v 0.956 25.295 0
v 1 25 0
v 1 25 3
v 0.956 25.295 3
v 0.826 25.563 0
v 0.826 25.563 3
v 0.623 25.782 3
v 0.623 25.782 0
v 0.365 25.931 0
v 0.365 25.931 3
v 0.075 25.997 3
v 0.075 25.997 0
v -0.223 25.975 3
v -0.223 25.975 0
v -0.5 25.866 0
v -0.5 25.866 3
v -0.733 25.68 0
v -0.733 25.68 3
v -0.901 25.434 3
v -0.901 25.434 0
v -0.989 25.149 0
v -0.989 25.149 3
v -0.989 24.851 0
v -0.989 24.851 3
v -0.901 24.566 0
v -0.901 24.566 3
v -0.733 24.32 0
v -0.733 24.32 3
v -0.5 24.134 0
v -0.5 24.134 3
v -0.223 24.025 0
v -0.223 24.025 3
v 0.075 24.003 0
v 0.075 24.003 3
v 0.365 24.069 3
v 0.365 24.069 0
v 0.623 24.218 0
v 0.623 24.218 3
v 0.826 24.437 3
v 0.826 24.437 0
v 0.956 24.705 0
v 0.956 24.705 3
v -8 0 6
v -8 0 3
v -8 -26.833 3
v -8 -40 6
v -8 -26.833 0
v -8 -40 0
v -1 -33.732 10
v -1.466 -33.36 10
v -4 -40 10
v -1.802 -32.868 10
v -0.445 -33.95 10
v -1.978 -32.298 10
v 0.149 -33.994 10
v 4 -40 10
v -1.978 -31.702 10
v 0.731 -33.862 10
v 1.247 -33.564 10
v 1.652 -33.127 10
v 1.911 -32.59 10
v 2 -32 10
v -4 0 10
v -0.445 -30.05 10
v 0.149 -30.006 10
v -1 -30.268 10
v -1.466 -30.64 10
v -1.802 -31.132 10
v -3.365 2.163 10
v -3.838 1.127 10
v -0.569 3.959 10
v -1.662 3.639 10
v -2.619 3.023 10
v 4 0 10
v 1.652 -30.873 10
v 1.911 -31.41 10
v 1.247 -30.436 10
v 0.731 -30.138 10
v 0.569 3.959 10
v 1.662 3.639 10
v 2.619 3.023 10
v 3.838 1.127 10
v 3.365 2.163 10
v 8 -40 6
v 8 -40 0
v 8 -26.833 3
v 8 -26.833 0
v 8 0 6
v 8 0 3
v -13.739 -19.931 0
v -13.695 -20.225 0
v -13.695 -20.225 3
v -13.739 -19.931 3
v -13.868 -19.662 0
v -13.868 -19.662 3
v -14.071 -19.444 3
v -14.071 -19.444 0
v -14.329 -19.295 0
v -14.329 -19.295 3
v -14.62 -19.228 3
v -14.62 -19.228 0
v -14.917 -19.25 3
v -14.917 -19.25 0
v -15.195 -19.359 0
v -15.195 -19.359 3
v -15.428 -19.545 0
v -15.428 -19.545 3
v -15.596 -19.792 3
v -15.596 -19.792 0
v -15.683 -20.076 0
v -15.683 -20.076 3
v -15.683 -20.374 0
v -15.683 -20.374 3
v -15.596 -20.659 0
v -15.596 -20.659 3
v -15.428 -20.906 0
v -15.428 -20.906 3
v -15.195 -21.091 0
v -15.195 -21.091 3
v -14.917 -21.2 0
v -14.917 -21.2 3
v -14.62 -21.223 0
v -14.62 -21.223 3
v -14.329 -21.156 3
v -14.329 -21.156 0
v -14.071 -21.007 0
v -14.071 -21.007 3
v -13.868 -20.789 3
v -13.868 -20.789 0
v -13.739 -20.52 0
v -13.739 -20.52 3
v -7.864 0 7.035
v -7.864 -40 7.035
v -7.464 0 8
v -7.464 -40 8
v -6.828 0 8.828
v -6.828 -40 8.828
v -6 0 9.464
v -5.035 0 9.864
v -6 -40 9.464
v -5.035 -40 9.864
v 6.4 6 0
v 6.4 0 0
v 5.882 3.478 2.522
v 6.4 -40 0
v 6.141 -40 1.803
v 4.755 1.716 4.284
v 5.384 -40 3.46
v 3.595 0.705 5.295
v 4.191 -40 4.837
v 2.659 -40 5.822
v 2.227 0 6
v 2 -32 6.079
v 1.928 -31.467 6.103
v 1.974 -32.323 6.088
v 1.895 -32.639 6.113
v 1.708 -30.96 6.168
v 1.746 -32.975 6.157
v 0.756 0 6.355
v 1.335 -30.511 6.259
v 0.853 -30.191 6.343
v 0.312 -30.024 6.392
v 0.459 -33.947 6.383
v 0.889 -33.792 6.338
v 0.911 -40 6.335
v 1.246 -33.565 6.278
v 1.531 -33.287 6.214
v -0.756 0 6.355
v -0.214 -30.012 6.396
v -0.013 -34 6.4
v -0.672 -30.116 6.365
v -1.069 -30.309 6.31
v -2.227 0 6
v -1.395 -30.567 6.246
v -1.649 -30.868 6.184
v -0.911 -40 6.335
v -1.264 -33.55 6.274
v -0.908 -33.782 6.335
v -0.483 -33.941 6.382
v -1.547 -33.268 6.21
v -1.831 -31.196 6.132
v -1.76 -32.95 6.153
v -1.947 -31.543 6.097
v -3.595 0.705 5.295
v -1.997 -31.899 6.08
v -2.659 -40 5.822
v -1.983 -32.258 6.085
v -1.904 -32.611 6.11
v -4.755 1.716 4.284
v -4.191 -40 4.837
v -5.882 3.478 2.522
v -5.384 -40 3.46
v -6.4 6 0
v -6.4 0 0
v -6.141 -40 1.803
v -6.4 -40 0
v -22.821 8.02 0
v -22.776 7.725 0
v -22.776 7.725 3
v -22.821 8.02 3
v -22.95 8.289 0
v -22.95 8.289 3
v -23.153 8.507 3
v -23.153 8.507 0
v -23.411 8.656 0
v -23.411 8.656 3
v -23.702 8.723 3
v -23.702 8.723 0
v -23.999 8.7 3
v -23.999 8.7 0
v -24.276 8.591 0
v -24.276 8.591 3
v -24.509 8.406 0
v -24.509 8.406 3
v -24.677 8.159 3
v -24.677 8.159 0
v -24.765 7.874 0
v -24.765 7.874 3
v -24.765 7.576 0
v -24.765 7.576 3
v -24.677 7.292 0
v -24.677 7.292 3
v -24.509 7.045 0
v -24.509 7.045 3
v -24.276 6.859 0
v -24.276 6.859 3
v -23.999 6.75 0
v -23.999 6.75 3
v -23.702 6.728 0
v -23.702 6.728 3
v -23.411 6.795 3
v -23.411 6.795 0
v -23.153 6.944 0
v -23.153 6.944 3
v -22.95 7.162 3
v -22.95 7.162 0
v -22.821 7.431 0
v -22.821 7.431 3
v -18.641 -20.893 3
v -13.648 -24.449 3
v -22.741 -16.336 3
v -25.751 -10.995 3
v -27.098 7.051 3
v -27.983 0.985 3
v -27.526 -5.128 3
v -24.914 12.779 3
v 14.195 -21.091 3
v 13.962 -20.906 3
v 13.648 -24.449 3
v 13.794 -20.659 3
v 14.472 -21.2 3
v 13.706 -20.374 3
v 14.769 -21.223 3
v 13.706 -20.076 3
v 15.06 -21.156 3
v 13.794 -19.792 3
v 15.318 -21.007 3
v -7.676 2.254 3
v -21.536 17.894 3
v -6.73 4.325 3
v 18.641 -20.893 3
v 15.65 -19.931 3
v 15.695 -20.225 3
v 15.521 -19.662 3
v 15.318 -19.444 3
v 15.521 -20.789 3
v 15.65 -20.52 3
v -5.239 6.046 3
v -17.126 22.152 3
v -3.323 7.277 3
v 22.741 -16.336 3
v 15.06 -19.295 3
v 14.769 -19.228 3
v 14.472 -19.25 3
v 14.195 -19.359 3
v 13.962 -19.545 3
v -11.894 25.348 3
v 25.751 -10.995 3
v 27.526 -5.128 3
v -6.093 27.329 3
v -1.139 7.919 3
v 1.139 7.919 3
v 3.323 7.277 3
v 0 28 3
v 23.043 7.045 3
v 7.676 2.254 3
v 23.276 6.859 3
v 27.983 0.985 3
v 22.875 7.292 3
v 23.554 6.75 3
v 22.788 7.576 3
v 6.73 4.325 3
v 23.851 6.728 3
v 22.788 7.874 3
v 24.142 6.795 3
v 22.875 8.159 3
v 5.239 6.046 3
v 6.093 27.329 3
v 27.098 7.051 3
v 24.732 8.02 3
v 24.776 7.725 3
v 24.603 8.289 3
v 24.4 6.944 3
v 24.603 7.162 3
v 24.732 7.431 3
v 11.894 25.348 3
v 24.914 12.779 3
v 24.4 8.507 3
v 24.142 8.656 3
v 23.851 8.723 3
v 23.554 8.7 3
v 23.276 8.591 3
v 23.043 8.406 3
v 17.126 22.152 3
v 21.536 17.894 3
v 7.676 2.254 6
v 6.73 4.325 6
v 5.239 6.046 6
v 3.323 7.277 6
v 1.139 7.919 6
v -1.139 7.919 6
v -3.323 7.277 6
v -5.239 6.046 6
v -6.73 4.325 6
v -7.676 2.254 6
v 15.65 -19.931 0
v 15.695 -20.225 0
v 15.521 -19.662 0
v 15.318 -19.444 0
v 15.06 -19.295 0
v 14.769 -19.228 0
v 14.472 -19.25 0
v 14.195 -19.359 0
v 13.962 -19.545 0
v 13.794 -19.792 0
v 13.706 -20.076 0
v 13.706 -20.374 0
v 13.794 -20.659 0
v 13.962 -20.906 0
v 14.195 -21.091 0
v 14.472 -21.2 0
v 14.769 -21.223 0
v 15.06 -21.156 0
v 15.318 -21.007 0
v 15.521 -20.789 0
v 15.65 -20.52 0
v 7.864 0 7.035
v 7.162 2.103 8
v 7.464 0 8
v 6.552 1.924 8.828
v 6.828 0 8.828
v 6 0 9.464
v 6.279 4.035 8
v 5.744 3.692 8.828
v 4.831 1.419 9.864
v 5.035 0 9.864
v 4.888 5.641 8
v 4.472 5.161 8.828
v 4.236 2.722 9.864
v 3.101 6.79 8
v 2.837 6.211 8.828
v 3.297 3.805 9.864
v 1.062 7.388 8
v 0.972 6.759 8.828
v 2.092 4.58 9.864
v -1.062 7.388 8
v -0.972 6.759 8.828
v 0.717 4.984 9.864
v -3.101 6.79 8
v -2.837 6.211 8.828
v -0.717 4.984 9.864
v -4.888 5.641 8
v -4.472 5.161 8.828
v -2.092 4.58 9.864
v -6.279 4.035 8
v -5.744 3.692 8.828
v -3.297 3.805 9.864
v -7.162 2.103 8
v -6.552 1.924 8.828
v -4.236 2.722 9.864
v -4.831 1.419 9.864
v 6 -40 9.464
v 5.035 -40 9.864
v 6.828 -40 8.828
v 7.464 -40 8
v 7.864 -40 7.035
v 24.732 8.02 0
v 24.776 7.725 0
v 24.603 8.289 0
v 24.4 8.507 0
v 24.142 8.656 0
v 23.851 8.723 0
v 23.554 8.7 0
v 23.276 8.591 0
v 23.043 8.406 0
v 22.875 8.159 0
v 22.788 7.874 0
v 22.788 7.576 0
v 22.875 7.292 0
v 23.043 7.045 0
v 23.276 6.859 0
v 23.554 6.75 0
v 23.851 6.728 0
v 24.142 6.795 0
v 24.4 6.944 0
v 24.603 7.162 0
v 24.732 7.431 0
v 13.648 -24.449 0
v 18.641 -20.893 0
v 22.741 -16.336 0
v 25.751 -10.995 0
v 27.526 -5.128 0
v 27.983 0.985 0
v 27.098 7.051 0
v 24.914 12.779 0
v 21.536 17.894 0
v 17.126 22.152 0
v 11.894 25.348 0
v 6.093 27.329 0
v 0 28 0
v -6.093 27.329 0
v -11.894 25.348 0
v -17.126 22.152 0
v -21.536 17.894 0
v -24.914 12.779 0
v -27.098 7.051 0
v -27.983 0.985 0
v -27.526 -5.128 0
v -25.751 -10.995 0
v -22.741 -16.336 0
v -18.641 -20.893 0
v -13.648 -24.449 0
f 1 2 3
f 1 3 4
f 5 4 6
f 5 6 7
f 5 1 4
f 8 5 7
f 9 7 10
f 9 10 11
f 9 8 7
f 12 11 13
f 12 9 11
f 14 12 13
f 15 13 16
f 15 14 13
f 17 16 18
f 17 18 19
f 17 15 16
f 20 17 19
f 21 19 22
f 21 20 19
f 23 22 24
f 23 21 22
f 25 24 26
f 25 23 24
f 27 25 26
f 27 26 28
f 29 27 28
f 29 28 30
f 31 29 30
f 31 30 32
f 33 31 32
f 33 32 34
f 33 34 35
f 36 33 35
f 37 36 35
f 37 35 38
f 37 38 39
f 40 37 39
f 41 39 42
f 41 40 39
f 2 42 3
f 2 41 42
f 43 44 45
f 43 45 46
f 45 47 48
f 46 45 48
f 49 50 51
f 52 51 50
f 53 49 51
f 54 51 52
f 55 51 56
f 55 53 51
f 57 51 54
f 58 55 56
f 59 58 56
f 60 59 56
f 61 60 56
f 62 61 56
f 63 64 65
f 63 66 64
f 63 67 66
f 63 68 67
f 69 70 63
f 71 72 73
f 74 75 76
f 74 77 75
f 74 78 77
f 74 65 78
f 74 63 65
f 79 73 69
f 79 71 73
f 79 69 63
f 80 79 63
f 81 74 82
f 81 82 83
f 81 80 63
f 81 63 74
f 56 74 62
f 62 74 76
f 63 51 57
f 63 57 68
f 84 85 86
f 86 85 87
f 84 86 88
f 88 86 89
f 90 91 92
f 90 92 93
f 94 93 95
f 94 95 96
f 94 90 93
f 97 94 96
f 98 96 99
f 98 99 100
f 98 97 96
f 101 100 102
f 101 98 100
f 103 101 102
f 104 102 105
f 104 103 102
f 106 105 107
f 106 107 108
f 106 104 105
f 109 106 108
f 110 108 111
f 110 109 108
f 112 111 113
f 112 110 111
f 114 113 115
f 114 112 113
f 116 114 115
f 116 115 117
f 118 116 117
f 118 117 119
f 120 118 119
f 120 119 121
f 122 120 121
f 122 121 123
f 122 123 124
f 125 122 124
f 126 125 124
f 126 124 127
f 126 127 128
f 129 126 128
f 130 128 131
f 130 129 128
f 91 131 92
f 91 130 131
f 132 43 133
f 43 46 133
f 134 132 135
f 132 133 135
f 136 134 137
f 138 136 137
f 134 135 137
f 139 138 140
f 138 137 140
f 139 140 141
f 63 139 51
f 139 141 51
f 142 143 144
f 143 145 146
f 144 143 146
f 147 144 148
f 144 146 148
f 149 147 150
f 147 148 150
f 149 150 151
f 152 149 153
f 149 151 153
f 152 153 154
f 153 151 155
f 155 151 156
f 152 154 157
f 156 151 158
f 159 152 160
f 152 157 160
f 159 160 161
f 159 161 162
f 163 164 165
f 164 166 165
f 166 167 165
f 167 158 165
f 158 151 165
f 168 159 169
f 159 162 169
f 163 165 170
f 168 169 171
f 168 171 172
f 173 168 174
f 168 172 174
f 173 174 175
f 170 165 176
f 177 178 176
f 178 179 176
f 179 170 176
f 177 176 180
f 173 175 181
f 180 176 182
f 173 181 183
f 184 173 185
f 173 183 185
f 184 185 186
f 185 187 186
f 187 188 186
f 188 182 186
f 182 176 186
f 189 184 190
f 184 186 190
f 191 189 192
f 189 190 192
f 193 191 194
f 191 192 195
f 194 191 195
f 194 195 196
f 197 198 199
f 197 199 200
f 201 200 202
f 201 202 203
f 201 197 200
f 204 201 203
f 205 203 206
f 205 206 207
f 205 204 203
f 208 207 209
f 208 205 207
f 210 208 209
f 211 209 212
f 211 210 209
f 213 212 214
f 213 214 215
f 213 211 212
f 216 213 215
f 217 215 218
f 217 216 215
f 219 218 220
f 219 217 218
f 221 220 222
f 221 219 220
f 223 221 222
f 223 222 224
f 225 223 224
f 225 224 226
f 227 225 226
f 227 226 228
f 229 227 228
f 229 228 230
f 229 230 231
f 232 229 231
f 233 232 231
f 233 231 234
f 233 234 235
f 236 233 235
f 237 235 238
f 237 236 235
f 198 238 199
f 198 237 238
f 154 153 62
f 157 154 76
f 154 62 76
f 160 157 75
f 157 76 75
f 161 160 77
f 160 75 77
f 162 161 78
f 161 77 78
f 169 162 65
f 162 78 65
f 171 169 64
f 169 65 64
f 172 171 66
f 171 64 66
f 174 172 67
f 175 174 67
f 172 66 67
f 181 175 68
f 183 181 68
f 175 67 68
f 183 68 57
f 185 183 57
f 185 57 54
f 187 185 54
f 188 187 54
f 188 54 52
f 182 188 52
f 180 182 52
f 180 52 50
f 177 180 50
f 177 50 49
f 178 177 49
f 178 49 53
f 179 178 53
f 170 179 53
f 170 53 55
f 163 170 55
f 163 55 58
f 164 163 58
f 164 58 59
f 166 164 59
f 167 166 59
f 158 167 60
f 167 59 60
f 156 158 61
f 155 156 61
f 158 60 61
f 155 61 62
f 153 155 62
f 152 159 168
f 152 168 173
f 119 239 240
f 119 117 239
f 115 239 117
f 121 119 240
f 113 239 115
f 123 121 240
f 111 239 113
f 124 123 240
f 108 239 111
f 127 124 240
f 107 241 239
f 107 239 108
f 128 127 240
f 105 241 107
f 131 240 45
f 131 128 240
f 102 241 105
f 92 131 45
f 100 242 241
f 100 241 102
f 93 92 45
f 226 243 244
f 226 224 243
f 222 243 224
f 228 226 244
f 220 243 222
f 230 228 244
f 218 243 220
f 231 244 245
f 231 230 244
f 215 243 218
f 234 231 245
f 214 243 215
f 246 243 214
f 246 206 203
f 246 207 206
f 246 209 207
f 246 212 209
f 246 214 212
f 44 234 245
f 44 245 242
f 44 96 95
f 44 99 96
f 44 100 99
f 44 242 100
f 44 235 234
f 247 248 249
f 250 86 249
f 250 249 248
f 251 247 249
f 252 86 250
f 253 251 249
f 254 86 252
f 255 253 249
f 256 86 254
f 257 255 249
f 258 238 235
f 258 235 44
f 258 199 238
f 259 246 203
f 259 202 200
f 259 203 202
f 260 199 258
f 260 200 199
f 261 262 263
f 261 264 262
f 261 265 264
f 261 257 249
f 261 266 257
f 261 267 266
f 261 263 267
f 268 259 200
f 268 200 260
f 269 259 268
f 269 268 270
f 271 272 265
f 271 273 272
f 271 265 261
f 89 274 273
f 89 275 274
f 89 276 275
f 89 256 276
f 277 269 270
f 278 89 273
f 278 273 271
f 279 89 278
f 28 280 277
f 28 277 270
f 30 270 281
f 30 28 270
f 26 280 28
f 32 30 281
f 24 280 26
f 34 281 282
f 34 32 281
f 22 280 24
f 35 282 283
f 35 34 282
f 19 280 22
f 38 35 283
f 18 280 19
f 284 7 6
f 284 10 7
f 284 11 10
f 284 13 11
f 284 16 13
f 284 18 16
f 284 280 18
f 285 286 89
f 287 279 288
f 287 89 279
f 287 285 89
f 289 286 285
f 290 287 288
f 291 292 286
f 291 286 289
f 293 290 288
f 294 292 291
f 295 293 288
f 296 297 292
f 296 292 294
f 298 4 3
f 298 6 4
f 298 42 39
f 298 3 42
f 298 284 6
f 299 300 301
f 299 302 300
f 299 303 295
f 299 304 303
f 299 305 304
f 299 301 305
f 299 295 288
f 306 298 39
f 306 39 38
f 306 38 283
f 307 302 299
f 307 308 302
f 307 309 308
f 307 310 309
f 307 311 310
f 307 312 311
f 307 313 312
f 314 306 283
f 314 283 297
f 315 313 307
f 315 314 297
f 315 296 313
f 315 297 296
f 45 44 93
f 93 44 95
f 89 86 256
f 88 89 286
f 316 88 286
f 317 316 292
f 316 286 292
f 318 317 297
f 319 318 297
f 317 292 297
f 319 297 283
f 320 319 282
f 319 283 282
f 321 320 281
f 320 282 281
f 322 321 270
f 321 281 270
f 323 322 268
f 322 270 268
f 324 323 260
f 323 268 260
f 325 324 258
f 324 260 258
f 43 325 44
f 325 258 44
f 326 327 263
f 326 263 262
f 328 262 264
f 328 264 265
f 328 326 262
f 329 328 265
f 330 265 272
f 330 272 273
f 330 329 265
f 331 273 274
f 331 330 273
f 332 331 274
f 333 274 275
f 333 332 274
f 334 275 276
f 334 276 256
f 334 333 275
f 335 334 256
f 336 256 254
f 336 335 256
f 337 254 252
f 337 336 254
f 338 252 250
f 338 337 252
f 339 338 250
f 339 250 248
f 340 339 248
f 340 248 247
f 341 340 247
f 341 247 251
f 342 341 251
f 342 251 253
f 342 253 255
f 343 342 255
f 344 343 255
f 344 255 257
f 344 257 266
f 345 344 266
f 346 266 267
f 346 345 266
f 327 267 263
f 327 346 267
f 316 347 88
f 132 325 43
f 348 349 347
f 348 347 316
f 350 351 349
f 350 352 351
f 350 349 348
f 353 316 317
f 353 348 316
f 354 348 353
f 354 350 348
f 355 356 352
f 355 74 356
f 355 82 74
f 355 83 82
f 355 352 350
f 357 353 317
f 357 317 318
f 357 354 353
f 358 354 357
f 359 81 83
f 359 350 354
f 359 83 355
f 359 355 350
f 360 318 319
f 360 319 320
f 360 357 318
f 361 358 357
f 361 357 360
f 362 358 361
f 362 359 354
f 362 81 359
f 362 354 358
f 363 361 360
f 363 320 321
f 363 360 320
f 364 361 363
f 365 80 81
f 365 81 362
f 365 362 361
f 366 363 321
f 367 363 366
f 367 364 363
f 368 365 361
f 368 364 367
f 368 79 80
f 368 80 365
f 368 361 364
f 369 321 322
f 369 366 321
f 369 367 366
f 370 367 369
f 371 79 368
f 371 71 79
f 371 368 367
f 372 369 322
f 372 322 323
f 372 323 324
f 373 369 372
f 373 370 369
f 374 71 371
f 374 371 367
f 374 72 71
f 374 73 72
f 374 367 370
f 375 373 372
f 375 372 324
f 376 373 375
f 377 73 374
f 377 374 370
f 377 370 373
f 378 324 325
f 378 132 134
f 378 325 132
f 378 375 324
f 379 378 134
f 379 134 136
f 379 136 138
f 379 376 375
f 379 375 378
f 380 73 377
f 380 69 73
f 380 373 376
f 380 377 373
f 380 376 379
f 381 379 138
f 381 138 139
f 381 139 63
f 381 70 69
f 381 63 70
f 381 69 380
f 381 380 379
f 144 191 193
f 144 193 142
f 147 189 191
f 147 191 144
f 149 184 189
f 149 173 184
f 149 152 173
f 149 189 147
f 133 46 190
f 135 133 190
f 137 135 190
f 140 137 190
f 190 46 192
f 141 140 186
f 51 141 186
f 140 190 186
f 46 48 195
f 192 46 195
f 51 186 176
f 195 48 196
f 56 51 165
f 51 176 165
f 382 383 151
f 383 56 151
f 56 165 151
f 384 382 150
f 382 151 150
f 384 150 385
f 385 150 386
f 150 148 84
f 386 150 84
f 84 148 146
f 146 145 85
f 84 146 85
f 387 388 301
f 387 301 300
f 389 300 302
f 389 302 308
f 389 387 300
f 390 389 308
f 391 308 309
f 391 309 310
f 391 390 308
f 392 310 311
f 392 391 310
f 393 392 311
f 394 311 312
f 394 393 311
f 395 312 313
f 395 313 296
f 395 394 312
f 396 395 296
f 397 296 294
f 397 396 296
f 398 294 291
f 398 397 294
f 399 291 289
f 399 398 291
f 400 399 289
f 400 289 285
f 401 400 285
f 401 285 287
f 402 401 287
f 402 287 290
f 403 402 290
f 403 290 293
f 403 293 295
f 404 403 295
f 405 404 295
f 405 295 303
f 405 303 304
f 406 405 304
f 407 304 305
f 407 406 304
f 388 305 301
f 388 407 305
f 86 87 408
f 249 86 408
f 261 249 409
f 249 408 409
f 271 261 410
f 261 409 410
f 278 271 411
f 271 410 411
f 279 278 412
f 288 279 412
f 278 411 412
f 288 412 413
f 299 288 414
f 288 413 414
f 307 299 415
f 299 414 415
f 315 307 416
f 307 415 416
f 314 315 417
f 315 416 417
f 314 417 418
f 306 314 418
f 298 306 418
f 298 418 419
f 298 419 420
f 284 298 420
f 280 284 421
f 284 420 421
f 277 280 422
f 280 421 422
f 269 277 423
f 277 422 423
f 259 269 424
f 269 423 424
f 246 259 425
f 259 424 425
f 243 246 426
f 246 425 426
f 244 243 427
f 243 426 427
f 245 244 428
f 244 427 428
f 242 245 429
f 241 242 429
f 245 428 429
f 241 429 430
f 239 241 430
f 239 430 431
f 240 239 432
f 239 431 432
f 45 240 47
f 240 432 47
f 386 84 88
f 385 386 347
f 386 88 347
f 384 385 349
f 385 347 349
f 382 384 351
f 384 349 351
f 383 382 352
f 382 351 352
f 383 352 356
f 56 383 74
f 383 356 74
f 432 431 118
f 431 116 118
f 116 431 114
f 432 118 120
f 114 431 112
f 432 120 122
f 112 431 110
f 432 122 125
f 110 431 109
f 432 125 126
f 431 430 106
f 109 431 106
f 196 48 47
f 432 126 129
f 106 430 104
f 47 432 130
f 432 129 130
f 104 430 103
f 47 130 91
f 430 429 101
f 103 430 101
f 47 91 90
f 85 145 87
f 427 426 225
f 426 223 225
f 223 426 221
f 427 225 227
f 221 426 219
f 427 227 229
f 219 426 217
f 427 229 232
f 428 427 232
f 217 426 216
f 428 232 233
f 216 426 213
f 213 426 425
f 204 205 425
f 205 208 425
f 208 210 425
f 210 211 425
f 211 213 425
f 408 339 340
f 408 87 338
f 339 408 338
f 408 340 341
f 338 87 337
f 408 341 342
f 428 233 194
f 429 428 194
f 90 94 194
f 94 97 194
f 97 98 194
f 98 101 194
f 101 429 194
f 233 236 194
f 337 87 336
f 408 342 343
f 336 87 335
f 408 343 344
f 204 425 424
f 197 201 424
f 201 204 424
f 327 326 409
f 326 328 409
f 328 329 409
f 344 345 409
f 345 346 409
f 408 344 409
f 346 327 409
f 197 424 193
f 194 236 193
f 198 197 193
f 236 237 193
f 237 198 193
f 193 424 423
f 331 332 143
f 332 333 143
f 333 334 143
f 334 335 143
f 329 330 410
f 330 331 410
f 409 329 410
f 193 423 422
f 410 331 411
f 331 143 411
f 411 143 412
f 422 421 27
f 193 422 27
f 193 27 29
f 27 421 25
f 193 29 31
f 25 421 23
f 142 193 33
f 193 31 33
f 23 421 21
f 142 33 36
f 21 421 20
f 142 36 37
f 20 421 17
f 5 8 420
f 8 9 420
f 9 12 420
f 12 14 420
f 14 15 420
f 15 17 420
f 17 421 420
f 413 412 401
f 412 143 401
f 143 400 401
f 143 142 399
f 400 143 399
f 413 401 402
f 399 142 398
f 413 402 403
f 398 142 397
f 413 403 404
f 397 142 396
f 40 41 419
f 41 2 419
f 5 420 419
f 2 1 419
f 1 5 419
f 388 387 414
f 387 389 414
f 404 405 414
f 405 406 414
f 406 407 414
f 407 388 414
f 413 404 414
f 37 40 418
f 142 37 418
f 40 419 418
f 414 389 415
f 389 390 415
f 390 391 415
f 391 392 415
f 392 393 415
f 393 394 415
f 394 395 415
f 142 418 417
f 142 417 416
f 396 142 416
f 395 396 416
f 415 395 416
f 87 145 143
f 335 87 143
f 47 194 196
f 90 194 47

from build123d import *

# Parameters (mm, degrees)
SKETCH_R        = 1
PAD_DEPTH       = 3
PAD001_DEPTH    = 7
SKETCH002_R     = 6.4
POCKET_DEPTH    = 40
CHAMFER_SIZE    = 6
SKETCH003_R     = 2
POCKET001_DEPTH = 5
FILLET_R        = 4


with BuildPart() as part:
    # Sketch → Pad (new body)
    with BuildSketch(Plane.XY):
        with BuildLine():
            Line((-8, -40), (8, -40))
            Line((8, -40), (8, -26.832816))
            ThreePointArc((8, -26.832816), (0, 28), (-8, -26.832816))
            Line((-8, -26.832816), (-8, -40))
        make_face()
        with Locations((0, 25)):
            Circle(SKETCH_R, mode=Mode.SUBTRACT)
        with Locations((-23.776413, 7.725425)):
            Circle(SKETCH_R, mode=Mode.SUBTRACT)
        with Locations((-14.694631, -20.225425)):
            Circle(SKETCH_R, mode=Mode.SUBTRACT)
        with Locations((14.694631, -20.225425)):
            Circle(SKETCH_R, mode=Mode.SUBTRACT)
        with Locations((23.776413, 7.725425)):
            Circle(SKETCH_R, mode=Mode.SUBTRACT)
    extrude(amount=PAD_DEPTH)

    # Sketch001 (on Face11 of Pad) → Pad001 (join)
    with BuildSketch(Plane.XY.offset(3)):
        with BuildLine():
            Line((-8, -40), (8, -40))
            Line((8, -40), (8, 0))
            ThreePointArc((8, 0), (0, 8), (-8, 0))
            Line((-8, 0), (-8, -40))
        make_face()
    extrude(amount=PAD001_DEPTH)

    # Sketch002 (on Face1 of Pad001) → Pocket (cut)
    with BuildSketch(Plane.XZ.offset(40)):
        Circle(SKETCH002_R)
    extrude(amount=-POCKET_DEPTH, mode=Mode.SUBTRACT)

    # Chamfer
    chamfer_edges = [part.edges().sort_by_distance(p)[0] for p in [
        (0, 0, 0),
    ]]
    chamfer(chamfer_edges, length=CHAMFER_SIZE)

    # Sketch003 (on Face19 of Chamfer) → Pocket001 (cut)
    with BuildSketch(Plane.XY.offset(10)):
        with Locations((0, -32)):
            Circle(SKETCH003_R)
    extrude(amount=-POCKET001_DEPTH, mode=Mode.SUBTRACT)

    # Fillet
    fillet_edges = [part.edges().sort_by_distance(p)[0] for p in [
        (-8, -20, 10),
        (8, -20, 10),
        (0, 8, 10),
    ]]
    fillet(fillet_edges, radius=FILLET_R)


solid = part.part
